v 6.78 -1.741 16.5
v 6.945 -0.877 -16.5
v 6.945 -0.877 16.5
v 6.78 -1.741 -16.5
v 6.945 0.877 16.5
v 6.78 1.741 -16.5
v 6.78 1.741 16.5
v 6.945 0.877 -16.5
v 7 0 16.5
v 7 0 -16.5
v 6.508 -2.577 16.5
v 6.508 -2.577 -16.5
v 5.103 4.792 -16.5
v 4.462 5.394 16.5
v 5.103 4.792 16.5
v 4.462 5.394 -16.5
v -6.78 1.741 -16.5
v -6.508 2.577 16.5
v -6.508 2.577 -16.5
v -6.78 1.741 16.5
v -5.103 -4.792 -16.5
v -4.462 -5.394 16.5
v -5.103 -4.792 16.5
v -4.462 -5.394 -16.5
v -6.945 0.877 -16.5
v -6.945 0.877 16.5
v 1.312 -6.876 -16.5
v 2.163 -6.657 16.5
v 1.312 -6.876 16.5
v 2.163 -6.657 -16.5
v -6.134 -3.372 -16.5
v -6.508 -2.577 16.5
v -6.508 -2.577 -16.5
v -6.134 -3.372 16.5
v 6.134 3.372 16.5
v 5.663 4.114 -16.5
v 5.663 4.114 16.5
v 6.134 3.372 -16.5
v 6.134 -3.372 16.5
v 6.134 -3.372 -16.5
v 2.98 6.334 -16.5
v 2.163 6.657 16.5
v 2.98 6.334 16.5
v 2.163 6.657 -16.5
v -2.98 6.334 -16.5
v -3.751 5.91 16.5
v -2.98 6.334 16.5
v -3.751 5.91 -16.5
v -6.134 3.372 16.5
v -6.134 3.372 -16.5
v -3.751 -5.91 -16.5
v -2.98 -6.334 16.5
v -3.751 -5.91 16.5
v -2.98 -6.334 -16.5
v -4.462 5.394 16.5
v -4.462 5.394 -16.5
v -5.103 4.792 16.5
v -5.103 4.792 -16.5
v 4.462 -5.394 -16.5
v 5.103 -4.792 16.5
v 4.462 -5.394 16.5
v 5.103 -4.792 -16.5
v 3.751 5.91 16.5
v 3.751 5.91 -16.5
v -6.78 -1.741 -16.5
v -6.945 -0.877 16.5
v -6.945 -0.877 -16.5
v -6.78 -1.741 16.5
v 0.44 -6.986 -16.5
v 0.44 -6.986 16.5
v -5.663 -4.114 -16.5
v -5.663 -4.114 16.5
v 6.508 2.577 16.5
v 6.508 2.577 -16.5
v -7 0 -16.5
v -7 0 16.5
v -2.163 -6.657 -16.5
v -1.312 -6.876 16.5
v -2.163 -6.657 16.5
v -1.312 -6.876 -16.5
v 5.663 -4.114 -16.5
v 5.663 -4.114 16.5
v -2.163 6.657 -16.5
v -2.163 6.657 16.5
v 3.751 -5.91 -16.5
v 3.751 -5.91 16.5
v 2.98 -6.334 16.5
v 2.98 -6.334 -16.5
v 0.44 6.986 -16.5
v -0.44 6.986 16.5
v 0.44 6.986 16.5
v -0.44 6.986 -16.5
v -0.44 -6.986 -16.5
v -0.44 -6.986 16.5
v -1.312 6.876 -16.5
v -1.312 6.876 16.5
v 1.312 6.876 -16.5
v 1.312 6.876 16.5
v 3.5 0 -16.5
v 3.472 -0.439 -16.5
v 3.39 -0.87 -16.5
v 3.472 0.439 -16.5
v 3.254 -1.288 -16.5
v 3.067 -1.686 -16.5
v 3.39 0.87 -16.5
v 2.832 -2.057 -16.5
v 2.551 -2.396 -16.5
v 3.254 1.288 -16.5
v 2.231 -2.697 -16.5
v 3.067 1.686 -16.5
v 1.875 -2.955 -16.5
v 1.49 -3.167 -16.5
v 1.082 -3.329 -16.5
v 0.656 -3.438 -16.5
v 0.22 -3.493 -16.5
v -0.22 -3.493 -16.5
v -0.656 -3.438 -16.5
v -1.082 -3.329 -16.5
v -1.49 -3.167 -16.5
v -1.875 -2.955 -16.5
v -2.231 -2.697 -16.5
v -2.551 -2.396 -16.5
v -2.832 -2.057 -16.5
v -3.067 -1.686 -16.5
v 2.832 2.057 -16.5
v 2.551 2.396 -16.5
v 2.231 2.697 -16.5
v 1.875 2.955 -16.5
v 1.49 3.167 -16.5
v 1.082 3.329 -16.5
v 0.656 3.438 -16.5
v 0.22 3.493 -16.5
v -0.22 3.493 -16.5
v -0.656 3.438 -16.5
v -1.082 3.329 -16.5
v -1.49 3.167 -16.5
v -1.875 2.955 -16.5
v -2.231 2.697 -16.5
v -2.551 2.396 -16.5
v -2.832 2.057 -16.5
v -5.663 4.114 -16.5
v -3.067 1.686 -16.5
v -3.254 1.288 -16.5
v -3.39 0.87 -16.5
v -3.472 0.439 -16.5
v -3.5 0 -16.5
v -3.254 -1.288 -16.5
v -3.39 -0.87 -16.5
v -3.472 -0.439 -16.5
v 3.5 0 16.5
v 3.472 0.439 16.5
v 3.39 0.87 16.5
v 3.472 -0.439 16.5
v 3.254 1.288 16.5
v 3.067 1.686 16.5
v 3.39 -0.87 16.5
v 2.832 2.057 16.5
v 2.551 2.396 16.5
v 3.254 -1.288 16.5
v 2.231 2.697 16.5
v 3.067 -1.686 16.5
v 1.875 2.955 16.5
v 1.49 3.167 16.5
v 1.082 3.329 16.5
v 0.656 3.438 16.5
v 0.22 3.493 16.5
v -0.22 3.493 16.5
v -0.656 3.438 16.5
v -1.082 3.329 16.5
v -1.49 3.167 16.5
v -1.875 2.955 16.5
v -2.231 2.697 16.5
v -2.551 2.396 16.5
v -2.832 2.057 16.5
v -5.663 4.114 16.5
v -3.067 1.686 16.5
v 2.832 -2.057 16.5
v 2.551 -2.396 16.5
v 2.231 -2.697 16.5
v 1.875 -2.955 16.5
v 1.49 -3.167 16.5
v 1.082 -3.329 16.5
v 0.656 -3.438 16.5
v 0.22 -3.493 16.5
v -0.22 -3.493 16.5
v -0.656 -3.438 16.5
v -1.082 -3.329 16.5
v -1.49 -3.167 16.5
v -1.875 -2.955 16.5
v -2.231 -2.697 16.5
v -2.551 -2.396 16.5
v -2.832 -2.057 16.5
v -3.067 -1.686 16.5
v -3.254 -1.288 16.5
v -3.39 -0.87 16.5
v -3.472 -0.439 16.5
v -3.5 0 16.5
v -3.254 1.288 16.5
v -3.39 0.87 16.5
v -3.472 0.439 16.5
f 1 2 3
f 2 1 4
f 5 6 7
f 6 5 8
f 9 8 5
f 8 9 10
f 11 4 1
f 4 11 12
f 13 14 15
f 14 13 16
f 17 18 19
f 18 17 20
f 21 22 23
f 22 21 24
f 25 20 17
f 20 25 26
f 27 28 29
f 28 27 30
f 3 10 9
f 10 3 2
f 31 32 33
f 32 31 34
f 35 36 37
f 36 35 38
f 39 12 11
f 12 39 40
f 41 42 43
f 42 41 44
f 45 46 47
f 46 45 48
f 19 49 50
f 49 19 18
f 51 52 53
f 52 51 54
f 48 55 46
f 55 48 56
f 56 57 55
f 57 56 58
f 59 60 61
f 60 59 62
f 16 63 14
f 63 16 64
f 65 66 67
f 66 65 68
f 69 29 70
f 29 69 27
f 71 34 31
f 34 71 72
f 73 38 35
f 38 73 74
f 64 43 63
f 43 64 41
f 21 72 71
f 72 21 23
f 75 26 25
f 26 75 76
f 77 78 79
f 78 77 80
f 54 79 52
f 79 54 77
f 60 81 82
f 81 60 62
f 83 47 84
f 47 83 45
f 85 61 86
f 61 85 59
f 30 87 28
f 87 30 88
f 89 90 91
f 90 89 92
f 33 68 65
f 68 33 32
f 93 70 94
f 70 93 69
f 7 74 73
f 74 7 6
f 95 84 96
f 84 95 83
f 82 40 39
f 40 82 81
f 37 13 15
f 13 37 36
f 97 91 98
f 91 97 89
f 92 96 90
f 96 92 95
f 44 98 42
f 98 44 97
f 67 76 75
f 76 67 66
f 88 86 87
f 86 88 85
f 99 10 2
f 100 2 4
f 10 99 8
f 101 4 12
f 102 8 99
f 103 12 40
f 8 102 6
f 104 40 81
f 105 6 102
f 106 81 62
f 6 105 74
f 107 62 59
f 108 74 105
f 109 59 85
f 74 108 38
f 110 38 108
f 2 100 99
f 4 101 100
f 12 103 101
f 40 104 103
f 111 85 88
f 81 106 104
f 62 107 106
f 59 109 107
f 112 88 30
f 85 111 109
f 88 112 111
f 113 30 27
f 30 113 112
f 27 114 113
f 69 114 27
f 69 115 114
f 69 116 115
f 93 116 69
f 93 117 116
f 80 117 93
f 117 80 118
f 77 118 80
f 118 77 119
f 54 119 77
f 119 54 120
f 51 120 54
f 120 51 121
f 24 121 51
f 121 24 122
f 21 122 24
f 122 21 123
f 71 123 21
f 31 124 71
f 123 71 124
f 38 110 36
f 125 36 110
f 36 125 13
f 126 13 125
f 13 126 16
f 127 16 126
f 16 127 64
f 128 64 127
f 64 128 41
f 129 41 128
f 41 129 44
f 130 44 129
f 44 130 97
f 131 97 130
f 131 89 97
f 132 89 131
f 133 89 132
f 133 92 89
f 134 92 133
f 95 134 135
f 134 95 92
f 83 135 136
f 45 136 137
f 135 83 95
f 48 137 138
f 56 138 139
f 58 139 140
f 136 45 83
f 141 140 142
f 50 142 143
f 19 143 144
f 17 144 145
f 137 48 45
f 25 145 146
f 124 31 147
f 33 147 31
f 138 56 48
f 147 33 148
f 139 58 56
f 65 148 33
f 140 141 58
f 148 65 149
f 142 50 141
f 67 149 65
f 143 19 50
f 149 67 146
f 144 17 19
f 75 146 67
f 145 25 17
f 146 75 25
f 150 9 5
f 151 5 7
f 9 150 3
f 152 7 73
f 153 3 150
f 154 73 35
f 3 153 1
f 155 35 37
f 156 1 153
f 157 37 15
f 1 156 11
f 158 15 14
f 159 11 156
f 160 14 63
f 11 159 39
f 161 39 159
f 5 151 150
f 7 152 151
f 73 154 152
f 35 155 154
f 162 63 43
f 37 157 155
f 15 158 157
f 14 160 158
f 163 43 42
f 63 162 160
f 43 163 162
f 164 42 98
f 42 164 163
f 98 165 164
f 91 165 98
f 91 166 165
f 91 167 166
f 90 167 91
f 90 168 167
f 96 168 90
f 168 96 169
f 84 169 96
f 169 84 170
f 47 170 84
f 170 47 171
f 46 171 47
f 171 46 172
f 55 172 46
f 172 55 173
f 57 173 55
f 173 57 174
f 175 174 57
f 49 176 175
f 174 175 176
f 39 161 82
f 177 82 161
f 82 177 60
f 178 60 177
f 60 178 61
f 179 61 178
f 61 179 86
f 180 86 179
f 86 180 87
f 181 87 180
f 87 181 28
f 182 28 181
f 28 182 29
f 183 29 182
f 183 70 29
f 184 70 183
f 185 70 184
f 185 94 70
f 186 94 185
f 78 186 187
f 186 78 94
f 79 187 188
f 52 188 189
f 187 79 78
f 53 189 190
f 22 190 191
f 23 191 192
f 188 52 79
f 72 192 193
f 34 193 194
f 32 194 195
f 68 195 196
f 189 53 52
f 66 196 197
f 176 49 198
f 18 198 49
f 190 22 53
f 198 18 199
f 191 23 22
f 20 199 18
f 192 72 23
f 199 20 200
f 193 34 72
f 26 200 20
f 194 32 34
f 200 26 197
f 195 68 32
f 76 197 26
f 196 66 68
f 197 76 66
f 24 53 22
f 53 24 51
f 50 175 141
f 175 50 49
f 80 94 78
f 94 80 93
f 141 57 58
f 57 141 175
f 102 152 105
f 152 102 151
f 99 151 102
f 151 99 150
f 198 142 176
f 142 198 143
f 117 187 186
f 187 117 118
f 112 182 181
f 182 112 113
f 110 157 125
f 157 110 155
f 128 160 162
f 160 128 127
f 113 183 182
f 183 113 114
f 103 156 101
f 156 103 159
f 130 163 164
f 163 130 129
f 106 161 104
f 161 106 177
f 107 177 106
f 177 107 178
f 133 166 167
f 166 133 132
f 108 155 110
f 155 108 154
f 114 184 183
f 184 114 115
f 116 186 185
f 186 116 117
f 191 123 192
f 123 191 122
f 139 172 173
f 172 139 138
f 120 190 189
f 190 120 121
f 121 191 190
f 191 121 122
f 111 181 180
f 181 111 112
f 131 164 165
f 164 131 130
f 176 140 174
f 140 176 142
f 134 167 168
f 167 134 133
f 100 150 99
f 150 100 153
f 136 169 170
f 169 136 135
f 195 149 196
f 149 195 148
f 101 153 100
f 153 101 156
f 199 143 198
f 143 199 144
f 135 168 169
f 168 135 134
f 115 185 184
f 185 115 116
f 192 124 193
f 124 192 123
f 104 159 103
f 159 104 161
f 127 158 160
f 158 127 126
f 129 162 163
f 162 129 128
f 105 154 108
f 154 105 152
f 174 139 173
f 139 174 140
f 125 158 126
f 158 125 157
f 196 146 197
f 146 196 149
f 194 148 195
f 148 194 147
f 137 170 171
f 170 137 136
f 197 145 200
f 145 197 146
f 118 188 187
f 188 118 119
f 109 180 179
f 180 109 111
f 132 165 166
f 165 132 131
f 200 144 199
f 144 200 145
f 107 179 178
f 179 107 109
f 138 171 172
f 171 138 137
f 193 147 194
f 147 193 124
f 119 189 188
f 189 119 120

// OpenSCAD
$fn = 50;


difference() {
	union() {
		translate(v = [0, 0, -16.5000000000]) {
			cylinder(h = 33, r = 7.0000000000);
		}
	}
	union() {
		translate(v = [0, 0, -100.0000000000]) {
			cylinder(h = 200, r = 3.5000000000);
		}
	}
}
